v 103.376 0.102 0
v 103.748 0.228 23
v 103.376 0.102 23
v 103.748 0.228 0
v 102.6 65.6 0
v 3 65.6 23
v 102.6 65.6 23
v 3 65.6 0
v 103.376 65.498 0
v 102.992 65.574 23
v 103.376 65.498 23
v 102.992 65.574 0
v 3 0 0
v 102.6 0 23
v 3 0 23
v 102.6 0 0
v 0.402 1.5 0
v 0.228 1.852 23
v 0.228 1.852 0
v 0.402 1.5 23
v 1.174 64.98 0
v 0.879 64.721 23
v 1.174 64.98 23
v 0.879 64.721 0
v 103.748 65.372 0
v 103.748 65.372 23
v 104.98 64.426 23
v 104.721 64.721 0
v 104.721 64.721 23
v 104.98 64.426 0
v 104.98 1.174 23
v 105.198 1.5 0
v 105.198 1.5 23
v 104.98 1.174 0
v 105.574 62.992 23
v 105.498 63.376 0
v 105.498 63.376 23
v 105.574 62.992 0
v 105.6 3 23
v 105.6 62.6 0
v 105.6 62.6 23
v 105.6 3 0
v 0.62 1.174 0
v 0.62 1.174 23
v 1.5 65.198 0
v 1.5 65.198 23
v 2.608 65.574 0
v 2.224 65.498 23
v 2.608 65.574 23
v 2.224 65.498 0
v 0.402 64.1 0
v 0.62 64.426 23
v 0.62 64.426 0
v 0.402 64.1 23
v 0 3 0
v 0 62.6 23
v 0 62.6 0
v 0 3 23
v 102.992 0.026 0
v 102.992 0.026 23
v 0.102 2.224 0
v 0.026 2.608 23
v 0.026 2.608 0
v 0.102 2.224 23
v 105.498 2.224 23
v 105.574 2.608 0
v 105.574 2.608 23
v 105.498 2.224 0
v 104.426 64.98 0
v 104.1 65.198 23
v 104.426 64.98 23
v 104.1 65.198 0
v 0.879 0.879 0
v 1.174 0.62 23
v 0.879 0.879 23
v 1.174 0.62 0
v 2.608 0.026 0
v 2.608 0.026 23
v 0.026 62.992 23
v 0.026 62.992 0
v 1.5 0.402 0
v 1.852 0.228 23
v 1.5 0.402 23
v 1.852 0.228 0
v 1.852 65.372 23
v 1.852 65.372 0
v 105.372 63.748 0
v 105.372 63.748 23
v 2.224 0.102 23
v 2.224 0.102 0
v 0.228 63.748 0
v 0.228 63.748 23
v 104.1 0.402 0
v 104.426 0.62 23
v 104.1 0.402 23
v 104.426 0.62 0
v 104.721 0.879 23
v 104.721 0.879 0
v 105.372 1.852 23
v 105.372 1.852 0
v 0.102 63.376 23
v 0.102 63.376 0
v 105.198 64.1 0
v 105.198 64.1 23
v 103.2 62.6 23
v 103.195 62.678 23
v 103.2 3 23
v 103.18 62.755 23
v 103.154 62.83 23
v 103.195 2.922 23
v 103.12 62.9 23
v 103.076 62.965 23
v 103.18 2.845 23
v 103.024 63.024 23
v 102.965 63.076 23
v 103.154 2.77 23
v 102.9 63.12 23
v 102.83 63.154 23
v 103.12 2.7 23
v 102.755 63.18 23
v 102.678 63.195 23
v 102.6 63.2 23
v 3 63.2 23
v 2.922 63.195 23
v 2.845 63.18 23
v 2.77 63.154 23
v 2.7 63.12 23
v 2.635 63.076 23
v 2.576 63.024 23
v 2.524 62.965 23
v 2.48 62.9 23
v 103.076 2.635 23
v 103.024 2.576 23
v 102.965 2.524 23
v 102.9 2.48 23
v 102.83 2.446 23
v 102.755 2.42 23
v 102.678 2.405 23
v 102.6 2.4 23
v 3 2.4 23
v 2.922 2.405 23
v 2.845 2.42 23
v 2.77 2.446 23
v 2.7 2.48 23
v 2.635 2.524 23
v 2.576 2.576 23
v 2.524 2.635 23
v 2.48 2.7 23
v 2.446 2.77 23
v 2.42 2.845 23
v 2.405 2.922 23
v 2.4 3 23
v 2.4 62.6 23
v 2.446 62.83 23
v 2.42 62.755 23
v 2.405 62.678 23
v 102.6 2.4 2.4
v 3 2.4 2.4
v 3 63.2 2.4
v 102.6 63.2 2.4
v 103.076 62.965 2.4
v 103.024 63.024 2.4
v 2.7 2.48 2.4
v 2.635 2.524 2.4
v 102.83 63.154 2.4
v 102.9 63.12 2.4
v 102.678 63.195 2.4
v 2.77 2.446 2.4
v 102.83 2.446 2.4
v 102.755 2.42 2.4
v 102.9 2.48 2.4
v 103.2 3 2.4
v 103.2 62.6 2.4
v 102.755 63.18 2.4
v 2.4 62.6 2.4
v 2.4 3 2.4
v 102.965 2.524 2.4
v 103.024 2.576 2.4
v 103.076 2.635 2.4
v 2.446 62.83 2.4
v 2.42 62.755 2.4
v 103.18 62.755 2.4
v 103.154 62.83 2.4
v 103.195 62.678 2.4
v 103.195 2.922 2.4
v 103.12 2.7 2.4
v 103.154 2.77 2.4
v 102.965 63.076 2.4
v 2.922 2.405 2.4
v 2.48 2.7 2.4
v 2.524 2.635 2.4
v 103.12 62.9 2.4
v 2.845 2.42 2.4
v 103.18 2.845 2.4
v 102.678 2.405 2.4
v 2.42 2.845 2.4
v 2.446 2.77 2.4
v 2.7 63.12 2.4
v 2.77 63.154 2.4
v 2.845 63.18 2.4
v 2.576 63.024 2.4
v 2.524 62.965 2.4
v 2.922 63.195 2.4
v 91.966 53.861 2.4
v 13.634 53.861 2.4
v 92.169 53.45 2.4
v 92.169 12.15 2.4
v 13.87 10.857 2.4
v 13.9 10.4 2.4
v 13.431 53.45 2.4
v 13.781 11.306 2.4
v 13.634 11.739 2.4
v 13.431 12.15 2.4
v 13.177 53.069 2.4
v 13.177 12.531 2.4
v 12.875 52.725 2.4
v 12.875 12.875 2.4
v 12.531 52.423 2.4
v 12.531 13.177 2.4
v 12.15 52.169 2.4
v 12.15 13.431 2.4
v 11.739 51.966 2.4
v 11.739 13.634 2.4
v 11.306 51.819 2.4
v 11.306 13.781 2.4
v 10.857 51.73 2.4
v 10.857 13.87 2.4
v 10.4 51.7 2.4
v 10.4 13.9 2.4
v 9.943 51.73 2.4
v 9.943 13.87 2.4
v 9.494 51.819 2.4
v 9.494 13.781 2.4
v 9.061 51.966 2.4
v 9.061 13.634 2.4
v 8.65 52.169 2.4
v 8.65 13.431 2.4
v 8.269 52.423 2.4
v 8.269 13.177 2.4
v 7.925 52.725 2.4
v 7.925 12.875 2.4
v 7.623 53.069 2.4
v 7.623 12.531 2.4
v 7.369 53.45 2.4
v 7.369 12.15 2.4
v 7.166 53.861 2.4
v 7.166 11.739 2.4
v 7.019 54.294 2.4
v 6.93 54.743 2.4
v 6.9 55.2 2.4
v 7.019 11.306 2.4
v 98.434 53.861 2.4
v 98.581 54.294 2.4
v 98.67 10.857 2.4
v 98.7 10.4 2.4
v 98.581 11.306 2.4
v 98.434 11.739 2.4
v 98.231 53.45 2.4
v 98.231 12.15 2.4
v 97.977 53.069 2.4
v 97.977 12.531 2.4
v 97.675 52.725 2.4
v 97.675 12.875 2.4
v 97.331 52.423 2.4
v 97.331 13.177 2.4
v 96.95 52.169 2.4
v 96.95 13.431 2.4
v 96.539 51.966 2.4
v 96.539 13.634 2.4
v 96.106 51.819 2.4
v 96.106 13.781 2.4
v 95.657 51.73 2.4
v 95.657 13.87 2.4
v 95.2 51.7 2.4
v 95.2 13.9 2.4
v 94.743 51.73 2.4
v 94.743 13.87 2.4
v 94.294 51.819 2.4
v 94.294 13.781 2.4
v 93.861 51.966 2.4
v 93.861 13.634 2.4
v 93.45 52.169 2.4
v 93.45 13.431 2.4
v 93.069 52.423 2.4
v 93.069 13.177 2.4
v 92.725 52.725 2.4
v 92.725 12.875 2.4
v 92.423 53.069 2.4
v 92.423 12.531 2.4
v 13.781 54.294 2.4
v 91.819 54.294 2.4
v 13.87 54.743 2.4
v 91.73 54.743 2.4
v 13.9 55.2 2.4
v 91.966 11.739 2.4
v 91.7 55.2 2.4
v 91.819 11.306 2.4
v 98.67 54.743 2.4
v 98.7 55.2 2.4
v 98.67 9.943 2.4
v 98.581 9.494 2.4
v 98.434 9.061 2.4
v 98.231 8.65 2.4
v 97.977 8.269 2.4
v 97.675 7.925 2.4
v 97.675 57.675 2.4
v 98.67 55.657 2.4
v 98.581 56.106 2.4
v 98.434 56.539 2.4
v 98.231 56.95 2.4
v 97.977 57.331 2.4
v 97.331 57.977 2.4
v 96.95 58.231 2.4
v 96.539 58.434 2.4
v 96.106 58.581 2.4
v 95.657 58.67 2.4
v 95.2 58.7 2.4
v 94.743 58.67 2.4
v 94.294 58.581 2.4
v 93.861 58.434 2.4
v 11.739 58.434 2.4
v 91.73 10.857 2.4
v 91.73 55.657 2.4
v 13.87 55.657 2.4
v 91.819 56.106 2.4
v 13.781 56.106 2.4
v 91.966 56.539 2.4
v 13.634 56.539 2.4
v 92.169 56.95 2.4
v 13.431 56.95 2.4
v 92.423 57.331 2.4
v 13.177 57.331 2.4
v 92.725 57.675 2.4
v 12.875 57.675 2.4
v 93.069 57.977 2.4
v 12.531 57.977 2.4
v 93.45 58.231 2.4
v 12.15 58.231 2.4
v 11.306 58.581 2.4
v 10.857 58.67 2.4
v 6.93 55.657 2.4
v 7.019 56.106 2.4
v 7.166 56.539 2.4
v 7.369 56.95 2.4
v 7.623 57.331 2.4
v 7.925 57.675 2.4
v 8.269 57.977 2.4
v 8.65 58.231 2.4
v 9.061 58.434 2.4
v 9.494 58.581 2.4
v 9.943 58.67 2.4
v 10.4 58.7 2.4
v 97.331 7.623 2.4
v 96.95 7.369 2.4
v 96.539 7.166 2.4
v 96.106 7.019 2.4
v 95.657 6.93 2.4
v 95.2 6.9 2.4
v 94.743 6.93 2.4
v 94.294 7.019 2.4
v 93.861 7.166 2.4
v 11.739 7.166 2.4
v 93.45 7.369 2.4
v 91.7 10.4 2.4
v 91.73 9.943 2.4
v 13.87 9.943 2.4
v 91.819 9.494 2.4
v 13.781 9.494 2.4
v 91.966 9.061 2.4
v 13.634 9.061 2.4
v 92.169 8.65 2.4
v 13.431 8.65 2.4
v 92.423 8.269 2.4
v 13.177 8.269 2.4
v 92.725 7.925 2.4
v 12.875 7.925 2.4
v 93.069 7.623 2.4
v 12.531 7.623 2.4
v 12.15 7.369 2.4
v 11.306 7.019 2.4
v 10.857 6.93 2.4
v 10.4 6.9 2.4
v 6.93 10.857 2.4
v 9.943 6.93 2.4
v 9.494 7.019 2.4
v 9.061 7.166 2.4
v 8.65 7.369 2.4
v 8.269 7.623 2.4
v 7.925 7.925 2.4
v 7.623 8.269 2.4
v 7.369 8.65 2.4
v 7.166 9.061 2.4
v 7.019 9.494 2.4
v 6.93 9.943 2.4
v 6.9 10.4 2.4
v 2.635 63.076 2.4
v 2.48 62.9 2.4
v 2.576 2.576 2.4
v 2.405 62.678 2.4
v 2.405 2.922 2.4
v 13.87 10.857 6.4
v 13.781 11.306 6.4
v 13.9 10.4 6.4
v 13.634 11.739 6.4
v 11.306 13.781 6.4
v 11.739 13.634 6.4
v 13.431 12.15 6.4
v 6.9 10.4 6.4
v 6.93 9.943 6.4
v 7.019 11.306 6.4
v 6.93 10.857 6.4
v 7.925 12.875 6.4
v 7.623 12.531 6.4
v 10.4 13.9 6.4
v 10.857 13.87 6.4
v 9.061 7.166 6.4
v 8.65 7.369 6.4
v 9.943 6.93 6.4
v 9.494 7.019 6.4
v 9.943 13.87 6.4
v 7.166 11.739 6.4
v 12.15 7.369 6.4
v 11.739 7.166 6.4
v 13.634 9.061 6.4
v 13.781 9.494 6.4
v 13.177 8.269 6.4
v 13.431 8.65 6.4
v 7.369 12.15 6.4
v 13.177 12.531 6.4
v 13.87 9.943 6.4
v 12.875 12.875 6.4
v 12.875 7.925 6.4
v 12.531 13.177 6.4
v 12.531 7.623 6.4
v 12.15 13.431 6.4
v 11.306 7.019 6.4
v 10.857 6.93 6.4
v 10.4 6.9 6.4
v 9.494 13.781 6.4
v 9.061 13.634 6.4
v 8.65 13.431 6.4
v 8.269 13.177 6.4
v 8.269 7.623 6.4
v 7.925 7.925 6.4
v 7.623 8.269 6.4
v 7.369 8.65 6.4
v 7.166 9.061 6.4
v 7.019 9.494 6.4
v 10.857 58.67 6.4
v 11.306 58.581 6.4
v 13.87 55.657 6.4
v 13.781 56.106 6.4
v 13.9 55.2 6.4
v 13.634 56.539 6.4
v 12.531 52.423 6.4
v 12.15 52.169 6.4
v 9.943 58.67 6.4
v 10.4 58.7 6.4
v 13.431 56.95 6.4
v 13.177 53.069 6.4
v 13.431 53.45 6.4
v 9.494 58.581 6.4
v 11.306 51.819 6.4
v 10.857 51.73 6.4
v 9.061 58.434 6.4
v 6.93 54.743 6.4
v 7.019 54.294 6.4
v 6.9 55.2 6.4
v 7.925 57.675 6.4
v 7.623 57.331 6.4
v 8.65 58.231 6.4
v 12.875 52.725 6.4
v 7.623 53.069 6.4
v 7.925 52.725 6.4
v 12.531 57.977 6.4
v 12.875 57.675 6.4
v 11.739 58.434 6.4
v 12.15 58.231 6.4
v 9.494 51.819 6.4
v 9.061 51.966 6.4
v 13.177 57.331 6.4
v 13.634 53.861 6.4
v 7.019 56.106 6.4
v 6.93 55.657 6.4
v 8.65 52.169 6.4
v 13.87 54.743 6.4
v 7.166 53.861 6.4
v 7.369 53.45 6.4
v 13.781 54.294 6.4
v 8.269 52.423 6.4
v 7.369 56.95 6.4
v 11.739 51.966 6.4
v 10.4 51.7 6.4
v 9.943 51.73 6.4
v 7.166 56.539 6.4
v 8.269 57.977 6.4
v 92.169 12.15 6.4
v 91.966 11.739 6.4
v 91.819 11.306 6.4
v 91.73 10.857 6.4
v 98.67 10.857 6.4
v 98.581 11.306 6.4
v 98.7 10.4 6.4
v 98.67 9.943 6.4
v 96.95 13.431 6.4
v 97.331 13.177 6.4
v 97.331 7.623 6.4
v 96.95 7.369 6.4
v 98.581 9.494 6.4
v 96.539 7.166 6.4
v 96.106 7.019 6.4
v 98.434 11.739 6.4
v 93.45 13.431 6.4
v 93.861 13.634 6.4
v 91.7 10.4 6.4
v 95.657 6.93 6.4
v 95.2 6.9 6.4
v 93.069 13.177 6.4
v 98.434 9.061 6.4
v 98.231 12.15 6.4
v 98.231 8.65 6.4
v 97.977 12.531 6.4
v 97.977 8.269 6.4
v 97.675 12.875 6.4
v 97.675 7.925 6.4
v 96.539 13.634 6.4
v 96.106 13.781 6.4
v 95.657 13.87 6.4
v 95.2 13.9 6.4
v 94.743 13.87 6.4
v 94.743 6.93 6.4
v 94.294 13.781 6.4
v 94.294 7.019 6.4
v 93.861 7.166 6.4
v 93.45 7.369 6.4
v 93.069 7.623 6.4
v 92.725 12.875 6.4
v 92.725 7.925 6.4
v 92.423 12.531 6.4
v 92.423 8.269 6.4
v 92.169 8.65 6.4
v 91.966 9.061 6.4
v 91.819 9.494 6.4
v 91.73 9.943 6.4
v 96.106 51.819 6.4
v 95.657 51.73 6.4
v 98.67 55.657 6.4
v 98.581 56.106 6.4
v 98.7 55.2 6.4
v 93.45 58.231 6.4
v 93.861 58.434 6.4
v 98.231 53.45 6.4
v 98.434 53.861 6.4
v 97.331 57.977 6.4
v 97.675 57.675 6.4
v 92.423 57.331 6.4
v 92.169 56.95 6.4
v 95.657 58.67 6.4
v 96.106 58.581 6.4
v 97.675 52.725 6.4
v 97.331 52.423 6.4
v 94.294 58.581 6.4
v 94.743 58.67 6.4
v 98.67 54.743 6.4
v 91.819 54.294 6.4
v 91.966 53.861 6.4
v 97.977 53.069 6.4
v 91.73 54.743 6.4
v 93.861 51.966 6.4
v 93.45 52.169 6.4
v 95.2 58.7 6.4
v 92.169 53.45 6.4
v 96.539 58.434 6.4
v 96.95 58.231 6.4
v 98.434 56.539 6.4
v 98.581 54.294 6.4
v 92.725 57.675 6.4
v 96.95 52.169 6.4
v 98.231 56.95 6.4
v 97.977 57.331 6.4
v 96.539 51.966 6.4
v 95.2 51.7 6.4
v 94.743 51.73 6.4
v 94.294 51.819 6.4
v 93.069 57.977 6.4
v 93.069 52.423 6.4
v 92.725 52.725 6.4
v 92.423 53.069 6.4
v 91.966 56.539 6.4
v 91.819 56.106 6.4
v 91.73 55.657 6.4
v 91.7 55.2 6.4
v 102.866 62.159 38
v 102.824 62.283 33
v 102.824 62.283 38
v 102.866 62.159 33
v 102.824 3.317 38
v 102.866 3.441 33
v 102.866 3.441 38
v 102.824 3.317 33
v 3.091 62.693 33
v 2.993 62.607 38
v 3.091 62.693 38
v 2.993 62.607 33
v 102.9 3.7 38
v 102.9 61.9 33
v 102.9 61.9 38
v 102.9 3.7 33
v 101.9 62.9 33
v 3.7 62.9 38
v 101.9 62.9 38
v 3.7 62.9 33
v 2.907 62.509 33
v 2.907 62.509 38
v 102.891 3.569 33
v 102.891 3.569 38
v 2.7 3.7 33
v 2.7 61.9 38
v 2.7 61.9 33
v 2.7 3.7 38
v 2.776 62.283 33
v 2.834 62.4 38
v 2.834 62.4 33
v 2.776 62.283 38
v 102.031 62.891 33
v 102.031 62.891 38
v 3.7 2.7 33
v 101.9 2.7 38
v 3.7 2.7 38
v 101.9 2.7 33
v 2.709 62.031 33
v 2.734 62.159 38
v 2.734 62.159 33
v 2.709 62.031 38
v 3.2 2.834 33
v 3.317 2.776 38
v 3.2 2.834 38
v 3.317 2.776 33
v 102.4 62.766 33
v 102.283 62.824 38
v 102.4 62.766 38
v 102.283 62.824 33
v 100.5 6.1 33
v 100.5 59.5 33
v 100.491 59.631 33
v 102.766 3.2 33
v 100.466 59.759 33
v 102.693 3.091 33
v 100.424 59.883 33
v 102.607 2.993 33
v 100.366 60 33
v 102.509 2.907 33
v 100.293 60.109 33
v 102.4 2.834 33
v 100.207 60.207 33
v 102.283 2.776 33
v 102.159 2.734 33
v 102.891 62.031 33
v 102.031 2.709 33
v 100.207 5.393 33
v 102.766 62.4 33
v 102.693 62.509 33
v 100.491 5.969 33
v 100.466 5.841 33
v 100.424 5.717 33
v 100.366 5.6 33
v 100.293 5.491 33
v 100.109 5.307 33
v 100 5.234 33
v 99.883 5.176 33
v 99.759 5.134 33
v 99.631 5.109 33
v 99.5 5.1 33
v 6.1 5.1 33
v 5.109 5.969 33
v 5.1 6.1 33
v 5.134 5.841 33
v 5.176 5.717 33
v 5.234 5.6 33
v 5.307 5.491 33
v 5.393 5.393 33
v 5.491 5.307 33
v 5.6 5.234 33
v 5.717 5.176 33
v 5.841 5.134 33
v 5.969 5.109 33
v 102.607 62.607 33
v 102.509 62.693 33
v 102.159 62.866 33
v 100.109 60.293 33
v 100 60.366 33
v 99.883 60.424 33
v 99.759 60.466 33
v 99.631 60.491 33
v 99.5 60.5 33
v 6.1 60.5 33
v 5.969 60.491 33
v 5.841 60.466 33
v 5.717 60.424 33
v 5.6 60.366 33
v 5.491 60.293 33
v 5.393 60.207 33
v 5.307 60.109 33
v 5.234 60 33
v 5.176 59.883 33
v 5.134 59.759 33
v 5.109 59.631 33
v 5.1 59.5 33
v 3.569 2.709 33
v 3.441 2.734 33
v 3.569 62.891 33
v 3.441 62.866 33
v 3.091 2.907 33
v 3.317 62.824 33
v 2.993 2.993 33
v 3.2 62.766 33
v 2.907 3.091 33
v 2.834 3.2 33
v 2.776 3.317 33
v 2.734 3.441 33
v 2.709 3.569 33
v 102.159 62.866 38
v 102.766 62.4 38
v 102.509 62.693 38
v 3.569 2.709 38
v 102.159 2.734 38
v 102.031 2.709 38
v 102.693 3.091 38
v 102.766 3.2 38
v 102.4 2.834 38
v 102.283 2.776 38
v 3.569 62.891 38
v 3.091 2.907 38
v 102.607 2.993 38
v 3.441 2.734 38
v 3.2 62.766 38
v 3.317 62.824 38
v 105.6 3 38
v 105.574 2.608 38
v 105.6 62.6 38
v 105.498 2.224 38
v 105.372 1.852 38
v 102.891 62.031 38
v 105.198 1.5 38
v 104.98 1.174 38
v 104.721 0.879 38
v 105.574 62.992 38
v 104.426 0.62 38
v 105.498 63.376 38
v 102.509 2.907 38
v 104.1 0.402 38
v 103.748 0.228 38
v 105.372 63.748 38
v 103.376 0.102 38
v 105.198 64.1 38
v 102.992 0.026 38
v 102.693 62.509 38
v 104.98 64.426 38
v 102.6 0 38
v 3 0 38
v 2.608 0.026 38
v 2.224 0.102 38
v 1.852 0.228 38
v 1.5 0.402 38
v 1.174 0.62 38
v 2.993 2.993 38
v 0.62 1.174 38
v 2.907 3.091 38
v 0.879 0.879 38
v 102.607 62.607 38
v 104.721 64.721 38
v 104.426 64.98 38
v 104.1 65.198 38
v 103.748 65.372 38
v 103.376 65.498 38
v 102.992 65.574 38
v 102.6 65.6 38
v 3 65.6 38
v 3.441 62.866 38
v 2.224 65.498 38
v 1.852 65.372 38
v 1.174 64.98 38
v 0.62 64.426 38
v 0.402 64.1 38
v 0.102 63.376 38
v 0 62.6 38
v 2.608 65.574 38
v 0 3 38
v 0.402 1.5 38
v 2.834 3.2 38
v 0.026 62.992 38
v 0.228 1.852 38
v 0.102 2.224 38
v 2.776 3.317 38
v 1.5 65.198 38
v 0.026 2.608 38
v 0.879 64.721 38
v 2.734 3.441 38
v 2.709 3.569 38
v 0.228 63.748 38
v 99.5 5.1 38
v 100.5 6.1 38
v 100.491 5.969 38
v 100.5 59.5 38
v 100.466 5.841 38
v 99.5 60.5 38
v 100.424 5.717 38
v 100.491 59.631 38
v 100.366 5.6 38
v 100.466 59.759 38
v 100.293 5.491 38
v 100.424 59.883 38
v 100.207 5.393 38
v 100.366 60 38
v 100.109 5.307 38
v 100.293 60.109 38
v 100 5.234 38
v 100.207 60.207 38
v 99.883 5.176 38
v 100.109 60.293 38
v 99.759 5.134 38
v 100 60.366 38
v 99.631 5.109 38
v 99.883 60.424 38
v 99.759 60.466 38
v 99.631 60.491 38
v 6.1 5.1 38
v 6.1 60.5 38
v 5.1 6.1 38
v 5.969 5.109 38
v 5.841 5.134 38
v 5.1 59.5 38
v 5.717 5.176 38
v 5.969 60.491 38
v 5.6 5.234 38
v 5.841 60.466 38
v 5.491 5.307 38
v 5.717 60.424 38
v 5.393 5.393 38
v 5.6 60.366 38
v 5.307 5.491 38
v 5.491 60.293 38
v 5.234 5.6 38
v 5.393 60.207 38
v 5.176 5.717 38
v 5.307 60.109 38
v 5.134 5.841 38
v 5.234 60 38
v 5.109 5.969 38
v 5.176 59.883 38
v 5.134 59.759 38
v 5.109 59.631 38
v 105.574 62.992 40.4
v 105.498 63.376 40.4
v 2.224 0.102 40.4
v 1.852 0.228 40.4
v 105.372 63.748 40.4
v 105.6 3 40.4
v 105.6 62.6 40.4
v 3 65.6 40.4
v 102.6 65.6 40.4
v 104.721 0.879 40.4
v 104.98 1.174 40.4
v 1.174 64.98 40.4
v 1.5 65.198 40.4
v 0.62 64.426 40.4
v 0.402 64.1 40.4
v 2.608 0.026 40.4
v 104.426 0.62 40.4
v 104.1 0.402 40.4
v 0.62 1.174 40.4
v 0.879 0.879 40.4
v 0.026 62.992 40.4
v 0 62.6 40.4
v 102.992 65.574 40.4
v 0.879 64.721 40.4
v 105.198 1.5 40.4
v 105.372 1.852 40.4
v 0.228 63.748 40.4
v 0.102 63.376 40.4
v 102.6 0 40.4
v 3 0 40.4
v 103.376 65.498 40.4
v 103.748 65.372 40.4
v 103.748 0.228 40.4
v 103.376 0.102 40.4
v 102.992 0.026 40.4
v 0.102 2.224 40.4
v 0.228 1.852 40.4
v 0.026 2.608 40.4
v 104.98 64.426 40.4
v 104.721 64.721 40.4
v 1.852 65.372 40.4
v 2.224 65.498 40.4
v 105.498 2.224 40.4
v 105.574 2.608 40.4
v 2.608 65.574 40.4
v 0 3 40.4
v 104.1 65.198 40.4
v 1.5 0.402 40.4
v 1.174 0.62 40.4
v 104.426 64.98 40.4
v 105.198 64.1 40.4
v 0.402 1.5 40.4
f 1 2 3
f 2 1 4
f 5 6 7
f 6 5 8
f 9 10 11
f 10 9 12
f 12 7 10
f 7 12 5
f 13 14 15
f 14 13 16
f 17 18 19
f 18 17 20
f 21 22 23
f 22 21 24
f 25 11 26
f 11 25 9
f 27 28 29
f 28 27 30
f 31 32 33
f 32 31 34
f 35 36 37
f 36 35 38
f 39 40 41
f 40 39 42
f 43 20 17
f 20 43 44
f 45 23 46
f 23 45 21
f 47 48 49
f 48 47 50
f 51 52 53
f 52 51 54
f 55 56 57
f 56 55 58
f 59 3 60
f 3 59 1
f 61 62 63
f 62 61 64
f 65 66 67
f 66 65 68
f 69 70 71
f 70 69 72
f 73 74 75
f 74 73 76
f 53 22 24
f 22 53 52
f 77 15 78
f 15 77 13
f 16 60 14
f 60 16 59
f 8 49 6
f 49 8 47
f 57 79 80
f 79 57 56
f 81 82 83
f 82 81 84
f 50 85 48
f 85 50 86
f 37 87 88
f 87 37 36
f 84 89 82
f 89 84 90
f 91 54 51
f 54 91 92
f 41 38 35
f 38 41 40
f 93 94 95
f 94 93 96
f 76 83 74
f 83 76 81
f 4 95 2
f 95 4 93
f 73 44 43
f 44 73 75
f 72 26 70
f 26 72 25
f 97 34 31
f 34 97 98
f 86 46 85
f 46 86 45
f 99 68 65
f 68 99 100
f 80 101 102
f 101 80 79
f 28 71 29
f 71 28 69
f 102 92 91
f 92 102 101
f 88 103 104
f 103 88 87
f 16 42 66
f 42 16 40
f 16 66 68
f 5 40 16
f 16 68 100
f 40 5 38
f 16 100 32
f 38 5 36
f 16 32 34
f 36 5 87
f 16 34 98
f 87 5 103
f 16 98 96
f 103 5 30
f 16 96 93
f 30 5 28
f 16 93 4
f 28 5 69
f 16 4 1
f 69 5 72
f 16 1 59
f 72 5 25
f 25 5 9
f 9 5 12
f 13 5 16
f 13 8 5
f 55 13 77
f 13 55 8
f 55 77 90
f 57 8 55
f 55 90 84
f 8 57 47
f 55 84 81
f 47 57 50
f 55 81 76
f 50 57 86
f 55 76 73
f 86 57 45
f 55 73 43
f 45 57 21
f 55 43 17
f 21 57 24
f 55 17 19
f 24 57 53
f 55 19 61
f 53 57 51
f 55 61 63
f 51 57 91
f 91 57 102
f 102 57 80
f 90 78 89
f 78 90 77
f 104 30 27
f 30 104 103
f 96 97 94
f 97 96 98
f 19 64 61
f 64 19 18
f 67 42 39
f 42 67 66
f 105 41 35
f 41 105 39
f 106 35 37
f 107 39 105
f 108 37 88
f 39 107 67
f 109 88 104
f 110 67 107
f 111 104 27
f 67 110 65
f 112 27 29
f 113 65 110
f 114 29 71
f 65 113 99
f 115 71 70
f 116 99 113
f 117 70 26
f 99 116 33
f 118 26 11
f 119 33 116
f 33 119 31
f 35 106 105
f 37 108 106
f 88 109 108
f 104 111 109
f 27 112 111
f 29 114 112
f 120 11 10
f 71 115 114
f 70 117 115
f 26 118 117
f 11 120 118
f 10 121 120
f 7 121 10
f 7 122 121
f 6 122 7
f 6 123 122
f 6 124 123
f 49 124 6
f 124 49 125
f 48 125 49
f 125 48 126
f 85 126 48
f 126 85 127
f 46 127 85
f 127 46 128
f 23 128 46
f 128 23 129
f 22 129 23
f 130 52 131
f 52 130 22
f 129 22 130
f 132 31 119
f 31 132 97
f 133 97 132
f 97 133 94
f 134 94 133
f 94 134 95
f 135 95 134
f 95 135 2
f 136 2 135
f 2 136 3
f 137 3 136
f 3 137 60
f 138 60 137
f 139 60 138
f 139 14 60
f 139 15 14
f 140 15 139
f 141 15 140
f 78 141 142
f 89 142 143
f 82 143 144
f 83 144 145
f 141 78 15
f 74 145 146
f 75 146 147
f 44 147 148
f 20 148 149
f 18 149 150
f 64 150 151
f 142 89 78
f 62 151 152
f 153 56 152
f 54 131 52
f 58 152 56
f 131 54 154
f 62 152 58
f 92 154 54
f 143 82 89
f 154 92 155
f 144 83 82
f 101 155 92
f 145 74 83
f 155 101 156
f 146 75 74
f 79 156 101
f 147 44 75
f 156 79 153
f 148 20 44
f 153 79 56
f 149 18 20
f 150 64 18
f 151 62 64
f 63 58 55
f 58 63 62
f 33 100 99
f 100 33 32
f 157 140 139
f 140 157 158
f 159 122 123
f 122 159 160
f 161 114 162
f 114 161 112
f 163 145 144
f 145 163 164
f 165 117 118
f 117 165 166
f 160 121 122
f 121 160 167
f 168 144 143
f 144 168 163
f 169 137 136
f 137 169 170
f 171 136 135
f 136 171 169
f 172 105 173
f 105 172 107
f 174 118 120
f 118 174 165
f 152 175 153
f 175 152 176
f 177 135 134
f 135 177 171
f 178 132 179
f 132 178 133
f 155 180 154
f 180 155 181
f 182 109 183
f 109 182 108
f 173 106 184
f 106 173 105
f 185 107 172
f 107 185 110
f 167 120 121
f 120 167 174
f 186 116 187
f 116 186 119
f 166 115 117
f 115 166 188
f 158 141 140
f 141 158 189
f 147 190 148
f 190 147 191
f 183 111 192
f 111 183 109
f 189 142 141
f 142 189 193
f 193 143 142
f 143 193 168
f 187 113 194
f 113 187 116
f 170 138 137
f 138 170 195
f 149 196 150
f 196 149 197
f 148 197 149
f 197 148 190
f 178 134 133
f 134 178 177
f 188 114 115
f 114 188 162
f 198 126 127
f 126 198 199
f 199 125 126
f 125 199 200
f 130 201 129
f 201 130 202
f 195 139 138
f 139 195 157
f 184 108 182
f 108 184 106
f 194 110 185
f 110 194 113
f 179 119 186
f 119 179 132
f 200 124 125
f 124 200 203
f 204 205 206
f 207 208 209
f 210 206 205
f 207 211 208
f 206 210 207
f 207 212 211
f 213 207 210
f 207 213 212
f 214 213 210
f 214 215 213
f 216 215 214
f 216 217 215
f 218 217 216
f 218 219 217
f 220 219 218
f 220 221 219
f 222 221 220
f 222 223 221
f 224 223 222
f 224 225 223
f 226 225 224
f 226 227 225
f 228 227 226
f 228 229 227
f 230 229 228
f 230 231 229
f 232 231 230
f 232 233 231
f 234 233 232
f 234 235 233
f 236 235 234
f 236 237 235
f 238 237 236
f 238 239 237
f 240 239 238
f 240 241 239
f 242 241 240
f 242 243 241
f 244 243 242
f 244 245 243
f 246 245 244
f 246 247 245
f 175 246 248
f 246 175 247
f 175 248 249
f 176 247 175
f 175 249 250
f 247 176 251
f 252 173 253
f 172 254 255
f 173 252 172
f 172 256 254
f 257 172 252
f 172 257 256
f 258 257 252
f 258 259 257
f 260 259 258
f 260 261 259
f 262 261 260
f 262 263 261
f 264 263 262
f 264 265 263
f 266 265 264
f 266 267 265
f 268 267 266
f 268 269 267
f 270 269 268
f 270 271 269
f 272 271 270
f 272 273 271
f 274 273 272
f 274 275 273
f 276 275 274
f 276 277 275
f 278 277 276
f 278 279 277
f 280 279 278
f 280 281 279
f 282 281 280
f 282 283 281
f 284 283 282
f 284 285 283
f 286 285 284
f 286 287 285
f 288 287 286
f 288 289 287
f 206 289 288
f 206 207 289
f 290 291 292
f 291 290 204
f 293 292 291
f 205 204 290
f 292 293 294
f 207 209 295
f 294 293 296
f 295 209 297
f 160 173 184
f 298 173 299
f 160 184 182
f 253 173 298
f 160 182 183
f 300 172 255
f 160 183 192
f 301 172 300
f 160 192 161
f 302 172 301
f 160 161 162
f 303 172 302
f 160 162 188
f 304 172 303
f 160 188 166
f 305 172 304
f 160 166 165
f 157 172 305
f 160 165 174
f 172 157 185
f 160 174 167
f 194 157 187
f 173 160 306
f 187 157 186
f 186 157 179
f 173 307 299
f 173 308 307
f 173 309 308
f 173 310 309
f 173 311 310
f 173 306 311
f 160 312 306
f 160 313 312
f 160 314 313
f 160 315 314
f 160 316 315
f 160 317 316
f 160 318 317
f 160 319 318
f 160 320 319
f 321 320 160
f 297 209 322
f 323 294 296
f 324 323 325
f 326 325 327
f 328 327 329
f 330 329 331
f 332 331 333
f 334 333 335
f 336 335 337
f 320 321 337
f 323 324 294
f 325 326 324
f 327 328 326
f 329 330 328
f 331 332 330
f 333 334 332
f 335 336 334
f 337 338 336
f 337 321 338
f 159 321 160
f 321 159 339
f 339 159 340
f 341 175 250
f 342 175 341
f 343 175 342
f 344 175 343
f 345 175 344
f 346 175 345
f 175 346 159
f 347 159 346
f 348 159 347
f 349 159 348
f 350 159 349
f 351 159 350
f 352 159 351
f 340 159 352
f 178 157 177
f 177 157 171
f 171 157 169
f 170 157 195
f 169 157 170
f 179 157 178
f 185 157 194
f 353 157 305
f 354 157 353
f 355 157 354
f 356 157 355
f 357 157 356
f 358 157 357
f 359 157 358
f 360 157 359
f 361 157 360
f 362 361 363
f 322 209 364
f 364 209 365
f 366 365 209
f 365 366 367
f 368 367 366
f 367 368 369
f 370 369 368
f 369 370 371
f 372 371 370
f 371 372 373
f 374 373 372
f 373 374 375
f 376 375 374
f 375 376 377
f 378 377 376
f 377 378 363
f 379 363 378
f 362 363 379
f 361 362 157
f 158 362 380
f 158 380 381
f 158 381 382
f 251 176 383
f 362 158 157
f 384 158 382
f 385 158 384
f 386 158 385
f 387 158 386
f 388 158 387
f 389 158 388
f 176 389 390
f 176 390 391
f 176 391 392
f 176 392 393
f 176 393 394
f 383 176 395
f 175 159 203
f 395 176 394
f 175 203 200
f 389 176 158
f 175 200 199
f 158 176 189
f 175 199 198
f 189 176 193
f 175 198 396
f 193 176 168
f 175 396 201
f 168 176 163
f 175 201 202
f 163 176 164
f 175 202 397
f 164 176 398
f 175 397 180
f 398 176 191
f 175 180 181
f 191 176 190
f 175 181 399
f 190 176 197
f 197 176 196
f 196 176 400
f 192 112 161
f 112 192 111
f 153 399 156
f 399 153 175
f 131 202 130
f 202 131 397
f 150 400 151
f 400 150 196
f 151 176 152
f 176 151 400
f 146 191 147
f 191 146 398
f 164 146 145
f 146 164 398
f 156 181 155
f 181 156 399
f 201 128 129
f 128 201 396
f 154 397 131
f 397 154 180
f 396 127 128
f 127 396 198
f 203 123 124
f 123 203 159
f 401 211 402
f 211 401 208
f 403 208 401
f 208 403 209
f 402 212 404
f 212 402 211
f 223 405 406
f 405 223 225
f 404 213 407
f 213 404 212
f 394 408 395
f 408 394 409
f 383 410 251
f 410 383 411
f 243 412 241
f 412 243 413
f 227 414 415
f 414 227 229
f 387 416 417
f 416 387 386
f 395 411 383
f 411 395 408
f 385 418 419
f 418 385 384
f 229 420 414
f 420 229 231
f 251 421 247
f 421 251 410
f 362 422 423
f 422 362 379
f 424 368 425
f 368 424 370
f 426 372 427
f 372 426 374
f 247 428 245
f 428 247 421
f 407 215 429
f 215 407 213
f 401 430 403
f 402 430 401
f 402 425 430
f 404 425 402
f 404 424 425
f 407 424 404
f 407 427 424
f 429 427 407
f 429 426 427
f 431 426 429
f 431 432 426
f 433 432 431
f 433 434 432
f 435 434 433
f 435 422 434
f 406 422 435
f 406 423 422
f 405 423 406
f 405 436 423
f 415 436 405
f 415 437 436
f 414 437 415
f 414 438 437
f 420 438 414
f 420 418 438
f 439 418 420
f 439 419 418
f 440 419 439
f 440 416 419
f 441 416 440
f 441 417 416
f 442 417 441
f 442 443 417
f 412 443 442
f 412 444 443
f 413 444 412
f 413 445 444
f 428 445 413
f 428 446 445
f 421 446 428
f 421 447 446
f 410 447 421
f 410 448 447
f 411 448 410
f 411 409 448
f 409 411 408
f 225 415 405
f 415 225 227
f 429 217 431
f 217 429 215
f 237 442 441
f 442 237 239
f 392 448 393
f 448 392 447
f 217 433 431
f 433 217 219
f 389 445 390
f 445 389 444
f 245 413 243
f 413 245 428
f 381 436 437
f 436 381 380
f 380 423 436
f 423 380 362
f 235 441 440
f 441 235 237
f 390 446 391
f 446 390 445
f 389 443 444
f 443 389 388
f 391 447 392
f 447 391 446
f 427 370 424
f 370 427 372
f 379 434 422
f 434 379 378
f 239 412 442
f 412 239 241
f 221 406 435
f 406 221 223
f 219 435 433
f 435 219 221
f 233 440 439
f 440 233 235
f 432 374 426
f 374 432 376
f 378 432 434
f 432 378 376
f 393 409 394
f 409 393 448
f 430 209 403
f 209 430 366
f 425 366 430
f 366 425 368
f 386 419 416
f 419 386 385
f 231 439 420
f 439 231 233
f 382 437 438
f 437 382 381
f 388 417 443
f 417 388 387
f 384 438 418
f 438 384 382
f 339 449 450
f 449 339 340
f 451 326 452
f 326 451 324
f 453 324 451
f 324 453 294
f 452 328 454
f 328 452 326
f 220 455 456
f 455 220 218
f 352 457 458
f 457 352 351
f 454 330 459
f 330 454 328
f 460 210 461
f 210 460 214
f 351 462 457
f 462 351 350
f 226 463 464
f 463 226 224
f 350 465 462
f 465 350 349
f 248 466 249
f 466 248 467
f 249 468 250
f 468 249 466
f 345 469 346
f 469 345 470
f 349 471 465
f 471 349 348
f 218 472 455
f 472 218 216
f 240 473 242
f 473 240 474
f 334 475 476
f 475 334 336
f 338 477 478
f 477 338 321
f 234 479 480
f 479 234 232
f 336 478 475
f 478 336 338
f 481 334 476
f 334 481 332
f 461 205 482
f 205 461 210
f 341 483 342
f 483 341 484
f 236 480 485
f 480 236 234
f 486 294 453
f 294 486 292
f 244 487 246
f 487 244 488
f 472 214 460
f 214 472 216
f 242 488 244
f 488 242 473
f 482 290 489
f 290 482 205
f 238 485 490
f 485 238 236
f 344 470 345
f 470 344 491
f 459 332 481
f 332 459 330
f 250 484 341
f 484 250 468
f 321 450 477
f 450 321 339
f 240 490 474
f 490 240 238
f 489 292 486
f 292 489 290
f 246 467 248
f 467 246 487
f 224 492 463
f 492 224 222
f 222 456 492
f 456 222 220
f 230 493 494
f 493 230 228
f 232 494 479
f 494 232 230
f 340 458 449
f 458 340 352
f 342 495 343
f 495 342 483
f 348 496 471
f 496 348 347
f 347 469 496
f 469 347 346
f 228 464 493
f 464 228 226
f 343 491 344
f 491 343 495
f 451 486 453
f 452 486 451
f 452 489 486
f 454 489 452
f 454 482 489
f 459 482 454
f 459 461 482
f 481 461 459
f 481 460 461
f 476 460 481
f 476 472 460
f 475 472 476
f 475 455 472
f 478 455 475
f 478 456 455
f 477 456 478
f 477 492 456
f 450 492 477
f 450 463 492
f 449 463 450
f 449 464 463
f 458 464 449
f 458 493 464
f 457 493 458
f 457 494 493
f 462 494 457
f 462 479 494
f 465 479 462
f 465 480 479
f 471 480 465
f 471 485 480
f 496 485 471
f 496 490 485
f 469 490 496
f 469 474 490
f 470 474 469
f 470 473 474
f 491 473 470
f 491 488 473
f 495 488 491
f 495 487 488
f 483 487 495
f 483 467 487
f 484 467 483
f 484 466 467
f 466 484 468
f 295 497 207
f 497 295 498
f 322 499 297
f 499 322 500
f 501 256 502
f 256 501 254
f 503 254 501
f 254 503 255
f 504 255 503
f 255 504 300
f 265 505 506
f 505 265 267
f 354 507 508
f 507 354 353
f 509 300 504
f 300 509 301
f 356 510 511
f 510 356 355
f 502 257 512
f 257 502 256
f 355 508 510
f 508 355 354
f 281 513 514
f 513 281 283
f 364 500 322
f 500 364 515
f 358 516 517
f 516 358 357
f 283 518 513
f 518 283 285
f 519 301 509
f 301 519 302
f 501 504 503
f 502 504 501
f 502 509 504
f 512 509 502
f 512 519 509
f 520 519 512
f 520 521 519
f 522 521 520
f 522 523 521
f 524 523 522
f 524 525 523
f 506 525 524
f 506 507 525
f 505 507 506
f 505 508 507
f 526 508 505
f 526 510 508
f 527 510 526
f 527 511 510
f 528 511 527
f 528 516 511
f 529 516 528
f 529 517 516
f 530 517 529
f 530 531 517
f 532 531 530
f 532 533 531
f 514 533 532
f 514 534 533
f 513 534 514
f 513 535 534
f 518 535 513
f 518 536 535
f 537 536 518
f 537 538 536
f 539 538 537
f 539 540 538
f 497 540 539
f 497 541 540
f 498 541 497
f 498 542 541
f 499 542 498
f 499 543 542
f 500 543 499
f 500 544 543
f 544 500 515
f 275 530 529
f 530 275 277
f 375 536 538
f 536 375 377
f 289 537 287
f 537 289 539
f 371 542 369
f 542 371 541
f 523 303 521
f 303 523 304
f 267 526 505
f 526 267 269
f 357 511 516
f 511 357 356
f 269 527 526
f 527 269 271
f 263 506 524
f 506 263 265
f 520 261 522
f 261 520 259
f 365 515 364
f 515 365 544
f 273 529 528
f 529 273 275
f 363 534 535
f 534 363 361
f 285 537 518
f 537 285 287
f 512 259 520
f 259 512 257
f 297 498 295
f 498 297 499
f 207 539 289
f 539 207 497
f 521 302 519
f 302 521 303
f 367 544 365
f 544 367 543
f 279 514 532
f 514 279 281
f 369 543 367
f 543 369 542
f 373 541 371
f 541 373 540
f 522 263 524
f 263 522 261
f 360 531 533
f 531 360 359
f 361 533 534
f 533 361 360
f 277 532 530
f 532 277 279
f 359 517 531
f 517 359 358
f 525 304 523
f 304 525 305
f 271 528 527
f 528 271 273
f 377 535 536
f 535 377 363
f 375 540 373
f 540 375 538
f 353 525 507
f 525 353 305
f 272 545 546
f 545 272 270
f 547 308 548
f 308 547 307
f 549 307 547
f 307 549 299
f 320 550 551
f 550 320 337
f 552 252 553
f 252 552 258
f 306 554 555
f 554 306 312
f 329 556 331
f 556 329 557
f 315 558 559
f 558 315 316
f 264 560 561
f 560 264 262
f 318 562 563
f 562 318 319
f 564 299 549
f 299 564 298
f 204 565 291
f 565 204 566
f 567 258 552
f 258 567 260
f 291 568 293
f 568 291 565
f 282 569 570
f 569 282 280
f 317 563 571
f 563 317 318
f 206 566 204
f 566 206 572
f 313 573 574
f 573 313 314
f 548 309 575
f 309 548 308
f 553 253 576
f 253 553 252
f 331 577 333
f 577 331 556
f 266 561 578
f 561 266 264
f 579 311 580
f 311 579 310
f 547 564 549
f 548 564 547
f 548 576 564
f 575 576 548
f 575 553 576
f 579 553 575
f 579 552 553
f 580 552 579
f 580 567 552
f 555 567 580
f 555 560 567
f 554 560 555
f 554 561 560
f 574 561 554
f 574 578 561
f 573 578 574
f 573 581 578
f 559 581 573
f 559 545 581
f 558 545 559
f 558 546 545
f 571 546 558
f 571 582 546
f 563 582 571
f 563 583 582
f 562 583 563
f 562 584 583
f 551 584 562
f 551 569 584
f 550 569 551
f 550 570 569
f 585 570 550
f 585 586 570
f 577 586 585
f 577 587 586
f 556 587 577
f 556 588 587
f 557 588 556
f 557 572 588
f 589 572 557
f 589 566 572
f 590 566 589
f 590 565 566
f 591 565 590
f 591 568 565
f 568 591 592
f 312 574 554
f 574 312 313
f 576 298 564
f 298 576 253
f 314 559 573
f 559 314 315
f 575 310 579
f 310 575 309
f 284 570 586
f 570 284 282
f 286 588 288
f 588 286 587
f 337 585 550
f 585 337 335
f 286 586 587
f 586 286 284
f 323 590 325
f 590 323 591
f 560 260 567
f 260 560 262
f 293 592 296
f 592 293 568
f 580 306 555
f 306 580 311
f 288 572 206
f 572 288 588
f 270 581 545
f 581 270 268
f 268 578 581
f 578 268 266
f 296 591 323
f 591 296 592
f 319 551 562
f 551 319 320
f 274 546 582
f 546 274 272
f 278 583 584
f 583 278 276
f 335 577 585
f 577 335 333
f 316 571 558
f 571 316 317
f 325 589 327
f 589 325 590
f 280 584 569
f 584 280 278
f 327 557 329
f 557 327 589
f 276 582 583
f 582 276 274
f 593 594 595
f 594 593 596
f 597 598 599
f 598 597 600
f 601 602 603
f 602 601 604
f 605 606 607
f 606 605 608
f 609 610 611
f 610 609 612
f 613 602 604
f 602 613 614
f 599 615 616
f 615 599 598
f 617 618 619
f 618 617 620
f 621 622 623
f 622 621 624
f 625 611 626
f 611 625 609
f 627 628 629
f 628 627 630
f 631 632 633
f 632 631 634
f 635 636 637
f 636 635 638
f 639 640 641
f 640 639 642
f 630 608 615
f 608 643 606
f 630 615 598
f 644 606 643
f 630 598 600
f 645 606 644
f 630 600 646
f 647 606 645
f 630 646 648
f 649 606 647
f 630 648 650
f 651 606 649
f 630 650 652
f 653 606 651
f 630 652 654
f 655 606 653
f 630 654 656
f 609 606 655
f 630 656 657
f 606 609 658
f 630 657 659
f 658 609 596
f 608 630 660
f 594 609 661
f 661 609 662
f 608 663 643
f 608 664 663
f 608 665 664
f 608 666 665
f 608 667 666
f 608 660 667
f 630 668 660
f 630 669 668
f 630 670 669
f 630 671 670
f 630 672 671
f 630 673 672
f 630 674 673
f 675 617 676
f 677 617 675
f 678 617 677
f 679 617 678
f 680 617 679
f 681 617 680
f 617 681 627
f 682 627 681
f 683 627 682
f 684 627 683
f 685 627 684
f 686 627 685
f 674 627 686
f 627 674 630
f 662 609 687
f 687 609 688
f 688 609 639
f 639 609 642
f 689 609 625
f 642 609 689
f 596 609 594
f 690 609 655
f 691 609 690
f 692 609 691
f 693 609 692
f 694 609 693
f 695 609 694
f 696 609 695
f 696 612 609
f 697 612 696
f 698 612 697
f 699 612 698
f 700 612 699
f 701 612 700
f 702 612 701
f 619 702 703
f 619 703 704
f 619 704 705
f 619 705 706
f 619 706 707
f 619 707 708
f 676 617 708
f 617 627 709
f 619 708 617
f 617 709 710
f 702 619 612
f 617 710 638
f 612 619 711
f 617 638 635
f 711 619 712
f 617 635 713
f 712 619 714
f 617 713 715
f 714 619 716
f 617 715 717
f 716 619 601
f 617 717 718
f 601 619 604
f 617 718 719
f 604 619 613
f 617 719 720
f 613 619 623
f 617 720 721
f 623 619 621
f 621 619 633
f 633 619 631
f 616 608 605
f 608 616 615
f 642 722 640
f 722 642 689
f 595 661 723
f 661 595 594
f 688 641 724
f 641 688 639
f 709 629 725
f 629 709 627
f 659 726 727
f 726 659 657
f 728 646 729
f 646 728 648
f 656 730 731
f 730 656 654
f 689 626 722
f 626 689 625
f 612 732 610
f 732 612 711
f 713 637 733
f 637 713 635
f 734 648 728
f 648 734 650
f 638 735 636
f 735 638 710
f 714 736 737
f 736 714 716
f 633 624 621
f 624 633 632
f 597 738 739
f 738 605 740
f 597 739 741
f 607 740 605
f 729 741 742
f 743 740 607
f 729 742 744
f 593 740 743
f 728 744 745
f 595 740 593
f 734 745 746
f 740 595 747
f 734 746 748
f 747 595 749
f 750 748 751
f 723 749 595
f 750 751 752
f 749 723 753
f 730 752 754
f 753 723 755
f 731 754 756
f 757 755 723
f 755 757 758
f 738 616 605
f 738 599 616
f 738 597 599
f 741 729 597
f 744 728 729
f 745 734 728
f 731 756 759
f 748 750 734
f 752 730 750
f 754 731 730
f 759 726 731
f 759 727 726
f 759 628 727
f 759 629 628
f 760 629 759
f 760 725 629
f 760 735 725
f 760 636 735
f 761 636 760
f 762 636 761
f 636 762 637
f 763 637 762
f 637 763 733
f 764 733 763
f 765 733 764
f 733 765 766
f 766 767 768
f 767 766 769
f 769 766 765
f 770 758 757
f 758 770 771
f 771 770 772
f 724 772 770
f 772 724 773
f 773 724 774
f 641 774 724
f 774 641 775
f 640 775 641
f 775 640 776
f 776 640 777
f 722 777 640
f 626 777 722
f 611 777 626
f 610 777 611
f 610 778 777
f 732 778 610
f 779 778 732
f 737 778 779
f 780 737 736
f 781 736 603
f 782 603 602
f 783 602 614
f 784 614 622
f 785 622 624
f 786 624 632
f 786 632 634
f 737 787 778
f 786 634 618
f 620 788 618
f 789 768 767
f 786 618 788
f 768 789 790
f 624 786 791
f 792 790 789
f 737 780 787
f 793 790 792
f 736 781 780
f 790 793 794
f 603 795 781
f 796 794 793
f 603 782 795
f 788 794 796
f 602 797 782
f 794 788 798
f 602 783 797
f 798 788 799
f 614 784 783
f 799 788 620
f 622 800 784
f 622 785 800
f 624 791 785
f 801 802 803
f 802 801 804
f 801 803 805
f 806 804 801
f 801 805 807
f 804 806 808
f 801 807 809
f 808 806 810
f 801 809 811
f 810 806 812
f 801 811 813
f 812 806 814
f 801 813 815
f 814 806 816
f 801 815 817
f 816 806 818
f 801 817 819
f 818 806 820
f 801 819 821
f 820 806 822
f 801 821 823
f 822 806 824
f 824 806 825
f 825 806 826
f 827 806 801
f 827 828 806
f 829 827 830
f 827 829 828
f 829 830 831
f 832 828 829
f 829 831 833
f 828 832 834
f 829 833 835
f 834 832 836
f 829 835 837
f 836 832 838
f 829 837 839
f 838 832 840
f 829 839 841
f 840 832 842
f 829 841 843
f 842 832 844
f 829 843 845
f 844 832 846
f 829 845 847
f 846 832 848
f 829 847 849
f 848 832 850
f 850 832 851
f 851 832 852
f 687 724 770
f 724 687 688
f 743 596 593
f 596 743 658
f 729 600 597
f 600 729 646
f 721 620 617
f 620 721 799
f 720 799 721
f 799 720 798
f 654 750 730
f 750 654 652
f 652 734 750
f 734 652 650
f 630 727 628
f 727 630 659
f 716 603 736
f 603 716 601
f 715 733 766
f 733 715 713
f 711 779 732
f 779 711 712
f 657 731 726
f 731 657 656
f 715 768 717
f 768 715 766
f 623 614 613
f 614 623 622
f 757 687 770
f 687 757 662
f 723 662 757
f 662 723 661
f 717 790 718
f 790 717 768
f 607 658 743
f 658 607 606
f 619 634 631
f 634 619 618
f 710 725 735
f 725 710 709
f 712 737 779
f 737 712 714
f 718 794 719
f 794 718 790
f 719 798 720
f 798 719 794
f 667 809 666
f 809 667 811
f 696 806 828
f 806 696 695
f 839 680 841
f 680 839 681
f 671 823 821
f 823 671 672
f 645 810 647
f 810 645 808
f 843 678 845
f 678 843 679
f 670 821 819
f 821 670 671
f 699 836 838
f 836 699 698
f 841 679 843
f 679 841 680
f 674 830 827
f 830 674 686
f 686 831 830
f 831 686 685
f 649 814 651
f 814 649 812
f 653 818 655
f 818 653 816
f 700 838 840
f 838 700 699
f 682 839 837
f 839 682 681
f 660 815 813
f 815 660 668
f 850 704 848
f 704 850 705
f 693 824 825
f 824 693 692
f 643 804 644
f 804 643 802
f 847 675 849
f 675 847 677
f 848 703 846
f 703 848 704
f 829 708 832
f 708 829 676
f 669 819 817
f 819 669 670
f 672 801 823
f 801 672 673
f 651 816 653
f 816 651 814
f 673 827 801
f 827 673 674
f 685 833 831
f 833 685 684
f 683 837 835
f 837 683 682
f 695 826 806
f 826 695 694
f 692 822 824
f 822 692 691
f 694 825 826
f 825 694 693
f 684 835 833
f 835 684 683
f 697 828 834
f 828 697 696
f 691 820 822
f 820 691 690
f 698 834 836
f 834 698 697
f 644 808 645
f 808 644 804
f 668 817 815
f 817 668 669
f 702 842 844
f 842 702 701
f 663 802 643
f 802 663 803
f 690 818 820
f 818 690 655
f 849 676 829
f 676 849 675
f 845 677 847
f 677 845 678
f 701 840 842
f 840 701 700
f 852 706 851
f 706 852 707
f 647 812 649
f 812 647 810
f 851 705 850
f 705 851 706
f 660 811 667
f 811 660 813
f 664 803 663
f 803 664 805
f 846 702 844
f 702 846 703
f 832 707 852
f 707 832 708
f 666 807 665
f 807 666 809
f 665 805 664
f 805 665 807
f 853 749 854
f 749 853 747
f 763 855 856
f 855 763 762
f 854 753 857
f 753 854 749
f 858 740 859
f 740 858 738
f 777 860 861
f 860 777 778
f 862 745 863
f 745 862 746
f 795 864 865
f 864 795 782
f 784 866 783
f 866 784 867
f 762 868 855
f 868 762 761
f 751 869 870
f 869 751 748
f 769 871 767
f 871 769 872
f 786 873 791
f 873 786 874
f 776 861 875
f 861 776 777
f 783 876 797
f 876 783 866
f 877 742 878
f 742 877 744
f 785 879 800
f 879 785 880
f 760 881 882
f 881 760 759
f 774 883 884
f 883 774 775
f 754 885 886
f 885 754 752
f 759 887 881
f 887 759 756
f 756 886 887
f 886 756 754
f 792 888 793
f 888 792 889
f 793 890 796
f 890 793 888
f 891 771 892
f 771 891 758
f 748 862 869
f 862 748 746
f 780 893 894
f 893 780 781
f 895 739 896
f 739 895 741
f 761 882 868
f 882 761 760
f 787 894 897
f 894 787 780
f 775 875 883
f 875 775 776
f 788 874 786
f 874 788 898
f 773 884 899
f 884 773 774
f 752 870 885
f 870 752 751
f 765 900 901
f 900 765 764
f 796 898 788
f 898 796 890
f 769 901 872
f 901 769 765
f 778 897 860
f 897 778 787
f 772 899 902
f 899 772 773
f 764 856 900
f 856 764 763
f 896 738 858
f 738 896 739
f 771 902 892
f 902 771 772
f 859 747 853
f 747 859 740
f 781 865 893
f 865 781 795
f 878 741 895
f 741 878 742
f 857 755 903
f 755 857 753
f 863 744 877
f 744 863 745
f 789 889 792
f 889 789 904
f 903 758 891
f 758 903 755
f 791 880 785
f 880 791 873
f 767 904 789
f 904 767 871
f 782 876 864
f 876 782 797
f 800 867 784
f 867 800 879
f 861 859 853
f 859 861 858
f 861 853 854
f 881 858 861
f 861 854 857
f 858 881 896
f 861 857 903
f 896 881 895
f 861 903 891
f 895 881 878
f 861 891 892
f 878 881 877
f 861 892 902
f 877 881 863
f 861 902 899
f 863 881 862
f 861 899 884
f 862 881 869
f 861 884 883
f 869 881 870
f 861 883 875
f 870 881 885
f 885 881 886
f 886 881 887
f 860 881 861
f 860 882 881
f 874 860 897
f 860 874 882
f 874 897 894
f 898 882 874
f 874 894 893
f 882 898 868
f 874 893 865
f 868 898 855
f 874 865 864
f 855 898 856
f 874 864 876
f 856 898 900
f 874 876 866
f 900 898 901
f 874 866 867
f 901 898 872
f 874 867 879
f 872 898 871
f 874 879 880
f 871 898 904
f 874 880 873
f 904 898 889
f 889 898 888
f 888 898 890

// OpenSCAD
// =============================================================
// <PROJEKT> — parametrisches Gehäuse (OpenSCAD)
//
// TEMPLATE: Board-Maße aus KiCad holen, dann hier eintragen.
//   1. Board-Außenmaße: in KiCad → Edit → "Board Setup" oder den
//      Edge.Cuts-Layer ausmessen. Alternativ aus der .kicad_pcb:
//        python3 -c "import re,sys; c=open(sys.argv[1]).read(); \
//          xs=[float(x) for x in re.findall(r'\\((?:start|end)\\s+([0-9.-]+)\\s', c)]; \
//          print('Breite ~', max(xs)-min(xs))" hardware/kicad/<Projekt>.kicad_pcb
//   2. max_component_height: am realen Board mit Messschieber messen
//      (Board-Oberfläche bis Oberkante höchstes Bauteil) + 2-3mm Luft.
//
// Rendern:    openscad case.scad        (F5 Vorschau, F6 Render)
// STL-Export: openscad -o case_unterteil.stl -D 'part="bottom"' case.scad
//             openscad -o case_deckel.stl    -D 'part="top"'    case.scad
// =============================================================

/* [Welches Teil rendern] */
part = "both";  // [both, bottom, top]

/* [Board-Maße — AUS KICAD EINTRAGEN] */
board_w = 100;          // <-- Board-Breite (X) in mm
board_d = 60;           // <-- Board-Tiefe  (Y) in mm
board_thickness = 1.6;  // Standard-PCB-Dicke

/* [MESSEN am realen Board] */
max_component_height = 15;   // <-- höchstes Bauteil über dem Board + Luft
clearance_below = 4;         // Platz unter dem Board für THT-Pins

/* [Gehäuse-Parameter] */
wall = 2.4;            // Wandstärke (robust für FDM-Druck)
clearance = 0.4;       // Spaltmaß ums Board (Toleranz)
standoff_h = clearance_below;
standoff_d = 7;
corner_radius = 3;

/* [Versteckt] */
$fn = 48;
eps = 0.01;

inner_w = board_w + 2*clearance;
inner_d = board_d + 2*clearance;
inner_h = standoff_h + board_thickness + max_component_height;
outer_w = inner_w + 2*wall;
outer_d = inner_d + 2*wall;
outer_h = inner_h + wall;

module rrect(w, d, h, r) {
    hull() for (x=[r, w-r], y=[r, d-r])
        translate([x, y, 0]) cylinder(r=r, h=h);
}

module bottom() {
    difference() {
        rrect(outer_w, outer_d, outer_h, corner_radius);
        translate([wall, wall, wall])
            rrect(inner_w, inner_d, outer_h, max(corner_radius-wall, 0.5));
    }
    // Eck-Standoffs (Board ruht oben drauf). Bei langem Board ggf. mittlere
    // Reihe ergänzen: x-Liste um inner_w/2 erweitern.
    inset = 8;
    for (x=[inset, inner_w-inset], y=[inset, inner_d-inset])
        translate([wall+x, wall+y, wall])
            cylinder(d=standoff_d, h=standoff_h);

    // TODO: Connector-Ausschnitte. Position aus KiCad ablesen (X/Y der
    // Stecker-Footprints) und im difference() oben Material entfernen, z.B.:
    //   translate([outer_w-wall-eps, 20, wall+standoff_h+board_thickness])
    //     cube([wall+2*eps, 15, 10]);
}

module top() {
    lip_h = 5;
    lip_clearance = 0.3;
    difference() {
        union() {
            rrect(outer_w, outer_d, wall, corner_radius);
            translate([wall+lip_clearance, wall+lip_clearance, -lip_h])
                difference() {
                    rrect(inner_w-2*lip_clearance, inner_d-2*lip_clearance, lip_h, 1);
                    translate([wall, wall, -eps])
                        rrect(inner_w-2*wall-2*lip_clearance, inner_d-2*wall-2*lip_clearance, lip_h+2*eps, 1);
                }
        }
        // TODO: Lüftung / Display-Ausschnitt / Beschriftung im Deckel?
    }
}

if (part == "bottom" || part == "both") bottom();
if (part == "top" || part == "both")
    translate([0, 0, (part=="both") ? outer_h + 15 : 0]) top();
